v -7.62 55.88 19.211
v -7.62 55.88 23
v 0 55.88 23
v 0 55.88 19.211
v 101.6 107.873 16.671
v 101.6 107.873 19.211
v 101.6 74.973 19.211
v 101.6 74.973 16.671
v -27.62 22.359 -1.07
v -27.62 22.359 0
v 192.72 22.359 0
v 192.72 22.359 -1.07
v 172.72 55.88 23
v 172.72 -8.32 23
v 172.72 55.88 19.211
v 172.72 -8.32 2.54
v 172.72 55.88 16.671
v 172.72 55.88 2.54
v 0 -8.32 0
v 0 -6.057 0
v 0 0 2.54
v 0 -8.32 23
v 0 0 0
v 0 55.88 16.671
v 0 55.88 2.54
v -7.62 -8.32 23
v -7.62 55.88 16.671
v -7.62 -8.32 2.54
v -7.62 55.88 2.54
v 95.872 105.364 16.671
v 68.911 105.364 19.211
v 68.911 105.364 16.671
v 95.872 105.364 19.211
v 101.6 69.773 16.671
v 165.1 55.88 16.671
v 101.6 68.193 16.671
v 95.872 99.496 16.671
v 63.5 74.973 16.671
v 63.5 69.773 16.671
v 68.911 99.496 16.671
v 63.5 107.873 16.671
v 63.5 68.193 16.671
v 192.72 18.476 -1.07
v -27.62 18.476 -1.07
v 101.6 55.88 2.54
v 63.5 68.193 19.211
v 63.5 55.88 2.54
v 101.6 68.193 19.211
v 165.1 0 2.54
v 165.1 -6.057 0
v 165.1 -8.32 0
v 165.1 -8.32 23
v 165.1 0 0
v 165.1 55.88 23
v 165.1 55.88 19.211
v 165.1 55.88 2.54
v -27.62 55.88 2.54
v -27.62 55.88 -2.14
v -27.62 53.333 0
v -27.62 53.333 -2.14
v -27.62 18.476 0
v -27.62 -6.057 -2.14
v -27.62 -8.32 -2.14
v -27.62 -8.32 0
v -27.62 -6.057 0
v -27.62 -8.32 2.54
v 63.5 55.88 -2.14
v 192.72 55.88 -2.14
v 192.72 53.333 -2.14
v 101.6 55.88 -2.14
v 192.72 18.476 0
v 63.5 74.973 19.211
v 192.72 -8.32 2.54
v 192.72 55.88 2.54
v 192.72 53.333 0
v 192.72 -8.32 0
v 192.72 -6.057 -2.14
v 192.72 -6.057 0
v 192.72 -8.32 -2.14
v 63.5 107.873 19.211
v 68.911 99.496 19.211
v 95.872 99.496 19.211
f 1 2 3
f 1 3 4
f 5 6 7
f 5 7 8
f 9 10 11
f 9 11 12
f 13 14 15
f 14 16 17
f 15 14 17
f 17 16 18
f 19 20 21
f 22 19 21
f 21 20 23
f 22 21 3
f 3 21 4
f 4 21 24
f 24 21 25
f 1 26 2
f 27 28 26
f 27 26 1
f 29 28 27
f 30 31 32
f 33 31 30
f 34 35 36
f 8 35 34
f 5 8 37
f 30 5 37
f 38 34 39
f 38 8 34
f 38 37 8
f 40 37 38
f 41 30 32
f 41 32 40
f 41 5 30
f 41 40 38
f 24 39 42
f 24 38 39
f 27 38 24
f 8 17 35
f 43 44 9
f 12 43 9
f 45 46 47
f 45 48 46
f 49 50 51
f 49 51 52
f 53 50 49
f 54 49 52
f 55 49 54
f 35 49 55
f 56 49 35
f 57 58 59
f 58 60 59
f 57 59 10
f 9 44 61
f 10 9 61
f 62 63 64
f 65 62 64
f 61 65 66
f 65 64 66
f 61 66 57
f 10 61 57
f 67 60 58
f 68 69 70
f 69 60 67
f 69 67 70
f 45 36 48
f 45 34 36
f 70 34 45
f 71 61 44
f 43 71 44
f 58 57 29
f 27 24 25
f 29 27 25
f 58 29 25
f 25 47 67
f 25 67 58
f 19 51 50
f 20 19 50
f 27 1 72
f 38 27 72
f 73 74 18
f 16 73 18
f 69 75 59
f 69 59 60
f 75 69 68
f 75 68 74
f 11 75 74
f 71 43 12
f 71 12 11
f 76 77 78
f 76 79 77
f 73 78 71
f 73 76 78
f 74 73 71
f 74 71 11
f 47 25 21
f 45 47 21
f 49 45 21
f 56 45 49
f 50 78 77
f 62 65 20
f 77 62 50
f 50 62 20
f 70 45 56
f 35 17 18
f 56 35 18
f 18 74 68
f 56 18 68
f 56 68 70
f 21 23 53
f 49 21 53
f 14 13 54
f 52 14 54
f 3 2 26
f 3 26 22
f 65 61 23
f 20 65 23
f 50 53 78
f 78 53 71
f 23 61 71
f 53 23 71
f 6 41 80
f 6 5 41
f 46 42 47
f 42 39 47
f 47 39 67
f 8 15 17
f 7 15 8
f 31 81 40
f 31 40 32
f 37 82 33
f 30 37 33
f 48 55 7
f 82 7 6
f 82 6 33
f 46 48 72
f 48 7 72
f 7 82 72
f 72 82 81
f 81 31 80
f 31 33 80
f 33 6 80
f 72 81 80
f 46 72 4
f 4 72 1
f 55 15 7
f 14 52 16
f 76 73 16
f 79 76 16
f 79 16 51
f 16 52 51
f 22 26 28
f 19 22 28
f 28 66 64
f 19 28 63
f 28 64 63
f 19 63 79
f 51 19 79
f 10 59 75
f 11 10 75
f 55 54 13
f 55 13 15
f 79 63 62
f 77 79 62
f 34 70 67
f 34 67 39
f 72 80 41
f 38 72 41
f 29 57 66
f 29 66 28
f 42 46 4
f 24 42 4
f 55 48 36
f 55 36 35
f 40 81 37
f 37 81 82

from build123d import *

# Parameters (mm, degrees)
SKETCH1_W           = 165.1
SKETCH1_H           = 55.88
BOSS_EXTRUDE1_DEPTH = 2.54
SKETCH1_3_W         = 7.62
SKETCH1_3_H         = 55.88
BOSS_EXTRUDE2_DEPTH = 20
BOSS_EXTRUDE3_DEPTH = 64.2
BOSS_EXTRUDE4_REACH = 127.654
SKETCH3_W           = 2.139816337
SKETCH3_H           = 2.547064604
SKETCH3_H_2         = 2.262901763
SKETCH3_W_2         = 1.069908168
SKETCH3_H_3         = 3.883558818
BOSS_EXTRUDE5_DEPTH = 19.05
BOSS_EXTRUDE6_DEPTH = 2.54
SKETCH6_W           = 26.96027589
SKETCH6_H           = 5.867824753
CUT_EXTRUDE1_DEPTH  = 222.886131721


with BuildPart() as part:
    # Sketch1 → Boss-Extrude1 (new body)
    with BuildSketch(Plane.XY):
        with Locations((82.55, 27.94)):
            Rectangle(SKETCH1_W, SKETCH1_H)
    extrude(amount=BOSS_EXTRUDE1_DEPTH)

    # Sketch1<3> → Boss-Extrude2 (add)
    with BuildSketch(Plane.XY):
        with Locations((-3.81, 27.94)):
            Rectangle(SKETCH1_3_W, SKETCH1_3_H)
        with Locations((168.91, 27.94)):
            Rectangle(SKETCH1_3_W, SKETCH1_3_H)
    extrude(amount=BOSS_EXTRUDE2_DEPTH)

    # Sketch2 → Boss-Extrude3 (add)
    with BuildSketch(Plane(origin=(0, 55.88, 0), x_dir=(1, 0, 0), z_dir=(0, 1, 0))):
        Polygon((165.1, 0), (192.72, 0), (192.72, -2.54), (172.72, -2.54), (172.72, -23), (165.1, -23), align=None)
    boss_extrude3 = extrude(amount=-BOSS_EXTRUDE3_DEPTH)

    # Boss-Extrude4: up to this face of the body (flat: up to its plane)
    boss_extrude4_end = Plane(part.part.faces().sort_by_distance((192.72, 23.78, 1.27))[0])
    # Sketch3 → Boss-Extrude4 (add, up to the picked face)
    with BuildSketch(Plane(origin=(82.55, 0, 0), x_dir=(0, 0, -1), z_dir=(1, 0, 0)), mode=Mode.PRIVATE) as boss_extrude4_sk1:
        with Locations((1.069908169, 54.606467698)):
            Rectangle(SKETCH3_W, SKETCH3_H)
    boss_extrude4_tool1 = split(extrude(boss_extrude4_sk1.sketch, amount=BOSS_EXTRUDE4_REACH, mode=Mode.PRIVATE), bisect_by=boss_extrude4_end, keep=Keep.BOTH, mode=Mode.PRIVATE)
    # Sketch3 → Boss-Extrude4 (add, up to the picked face)
    with BuildSketch(Plane(origin=(82.55, 0, 0), x_dir=(0, 0, -1), z_dir=(1, 0, 0)), mode=Mode.PRIVATE) as boss_extrude4_sk2:
        with Locations((1.069908169, -7.188549119)):
            Rectangle(SKETCH3_W, SKETCH3_H_2)
    boss_extrude4_tool2 = split(extrude(boss_extrude4_sk2.sketch, amount=BOSS_EXTRUDE4_REACH, mode=Mode.PRIVATE), bisect_by=boss_extrude4_end, keep=Keep.BOTH, mode=Mode.PRIVATE)
    # Sketch3 → Boss-Extrude4 (add, up to the picked face)
    with BuildSketch(Plane(origin=(82.55, 0, 0), x_dir=(0, 0, -1), z_dir=(1, 0, 0)), mode=Mode.PRIVATE) as boss_extrude4_sk3:
        with Locations((0.534954084, 20.417406389)):
            Rectangle(SKETCH3_W_2, SKETCH3_H_3)
    boss_extrude4_tool3 = split(extrude(boss_extrude4_sk3.sketch, amount=BOSS_EXTRUDE4_REACH, mode=Mode.PRIVATE), bisect_by=boss_extrude4_end, keep=Keep.BOTH, mode=Mode.PRIVATE)
    boss_extrude4_1 = boss_extrude4_tool1.solids().sort_by(Axis((82.55, 54.606468, -1.069908), (1, 0, 0)))[0]
    add(boss_extrude4_1)
    boss_extrude4_2 = boss_extrude4_tool2.solids().sort_by(Axis((82.55, -7.188549, -1.069908), (1, 0, 0)))[0]
    add(boss_extrude4_2)
    boss_extrude4_3 = boss_extrude4_tool3.solids().sort_by(Axis((82.55, 20.417406, -0.534954), (1, 0, 0)))[0]
    add(boss_extrude4_3)
    boss_extrude4 = boss_extrude4_1 + boss_extrude4_2 + boss_extrude4_3  # Boss-Extrude4 as one shape, for the pattern or mirror that repeats it

    # Mirror1: Boss-Extrude3, Boss-Extrude4 across plane
    add(boss_extrude3.mirror(Plane(origin=(82.55, 0, 0), x_dir=(0, 0, 1), z_dir=(1, 0, 0))))
    add(boss_extrude4.mirror(Plane(origin=(82.55, 0, 0), x_dir=(0, 0, 1), z_dir=(1, 0, 0))))

    # Sketch4 → Boss-Extrude5 (add, symmetric)
    with BuildSketch(Plane(origin=(82.55, 0, 0), x_dir=(0, 0, -1), z_dir=(1, 0, 0))):
        Polygon((-19.210834703, 68.192686786), (-2.54, 55.88), (2.139816337, 55.88), (-16.670834703, 69.773104851), (-16.670834703, 107.873104851), (-19.210834703, 107.873104851), align=None)
    extrude(amount=BOSS_EXTRUDE5_DEPTH, both=True)

    # Sketch5 → Boss-Extrude6 (add)
    with BuildSketch(Plane.XY.offset(19.210834703)):
        Polygon((63.5, 68.192686786), (0, 55.88), (-7.62, 55.88), (63.5, 74.973238457), align=None)
        Polygon((101.6, 74.973238457), (101.6, 68.192686786), (165.1, 55.88), (172.72, 55.88), align=None)
    extrude(amount=-BOSS_EXTRUDE6_DEPTH)

    # Sketch6 → Cut-Extrude1 (cut, through all)
    with BuildSketch(Plane.XY.offset(19.210834703)):
        with Locations((82.391410142, 102.430230737)):
            Rectangle(SKETCH6_W, SKETCH6_H)
    extrude(amount=-CUT_EXTRUDE1_DEPTH, mode=Mode.SUBTRACT)


solid = part.part
